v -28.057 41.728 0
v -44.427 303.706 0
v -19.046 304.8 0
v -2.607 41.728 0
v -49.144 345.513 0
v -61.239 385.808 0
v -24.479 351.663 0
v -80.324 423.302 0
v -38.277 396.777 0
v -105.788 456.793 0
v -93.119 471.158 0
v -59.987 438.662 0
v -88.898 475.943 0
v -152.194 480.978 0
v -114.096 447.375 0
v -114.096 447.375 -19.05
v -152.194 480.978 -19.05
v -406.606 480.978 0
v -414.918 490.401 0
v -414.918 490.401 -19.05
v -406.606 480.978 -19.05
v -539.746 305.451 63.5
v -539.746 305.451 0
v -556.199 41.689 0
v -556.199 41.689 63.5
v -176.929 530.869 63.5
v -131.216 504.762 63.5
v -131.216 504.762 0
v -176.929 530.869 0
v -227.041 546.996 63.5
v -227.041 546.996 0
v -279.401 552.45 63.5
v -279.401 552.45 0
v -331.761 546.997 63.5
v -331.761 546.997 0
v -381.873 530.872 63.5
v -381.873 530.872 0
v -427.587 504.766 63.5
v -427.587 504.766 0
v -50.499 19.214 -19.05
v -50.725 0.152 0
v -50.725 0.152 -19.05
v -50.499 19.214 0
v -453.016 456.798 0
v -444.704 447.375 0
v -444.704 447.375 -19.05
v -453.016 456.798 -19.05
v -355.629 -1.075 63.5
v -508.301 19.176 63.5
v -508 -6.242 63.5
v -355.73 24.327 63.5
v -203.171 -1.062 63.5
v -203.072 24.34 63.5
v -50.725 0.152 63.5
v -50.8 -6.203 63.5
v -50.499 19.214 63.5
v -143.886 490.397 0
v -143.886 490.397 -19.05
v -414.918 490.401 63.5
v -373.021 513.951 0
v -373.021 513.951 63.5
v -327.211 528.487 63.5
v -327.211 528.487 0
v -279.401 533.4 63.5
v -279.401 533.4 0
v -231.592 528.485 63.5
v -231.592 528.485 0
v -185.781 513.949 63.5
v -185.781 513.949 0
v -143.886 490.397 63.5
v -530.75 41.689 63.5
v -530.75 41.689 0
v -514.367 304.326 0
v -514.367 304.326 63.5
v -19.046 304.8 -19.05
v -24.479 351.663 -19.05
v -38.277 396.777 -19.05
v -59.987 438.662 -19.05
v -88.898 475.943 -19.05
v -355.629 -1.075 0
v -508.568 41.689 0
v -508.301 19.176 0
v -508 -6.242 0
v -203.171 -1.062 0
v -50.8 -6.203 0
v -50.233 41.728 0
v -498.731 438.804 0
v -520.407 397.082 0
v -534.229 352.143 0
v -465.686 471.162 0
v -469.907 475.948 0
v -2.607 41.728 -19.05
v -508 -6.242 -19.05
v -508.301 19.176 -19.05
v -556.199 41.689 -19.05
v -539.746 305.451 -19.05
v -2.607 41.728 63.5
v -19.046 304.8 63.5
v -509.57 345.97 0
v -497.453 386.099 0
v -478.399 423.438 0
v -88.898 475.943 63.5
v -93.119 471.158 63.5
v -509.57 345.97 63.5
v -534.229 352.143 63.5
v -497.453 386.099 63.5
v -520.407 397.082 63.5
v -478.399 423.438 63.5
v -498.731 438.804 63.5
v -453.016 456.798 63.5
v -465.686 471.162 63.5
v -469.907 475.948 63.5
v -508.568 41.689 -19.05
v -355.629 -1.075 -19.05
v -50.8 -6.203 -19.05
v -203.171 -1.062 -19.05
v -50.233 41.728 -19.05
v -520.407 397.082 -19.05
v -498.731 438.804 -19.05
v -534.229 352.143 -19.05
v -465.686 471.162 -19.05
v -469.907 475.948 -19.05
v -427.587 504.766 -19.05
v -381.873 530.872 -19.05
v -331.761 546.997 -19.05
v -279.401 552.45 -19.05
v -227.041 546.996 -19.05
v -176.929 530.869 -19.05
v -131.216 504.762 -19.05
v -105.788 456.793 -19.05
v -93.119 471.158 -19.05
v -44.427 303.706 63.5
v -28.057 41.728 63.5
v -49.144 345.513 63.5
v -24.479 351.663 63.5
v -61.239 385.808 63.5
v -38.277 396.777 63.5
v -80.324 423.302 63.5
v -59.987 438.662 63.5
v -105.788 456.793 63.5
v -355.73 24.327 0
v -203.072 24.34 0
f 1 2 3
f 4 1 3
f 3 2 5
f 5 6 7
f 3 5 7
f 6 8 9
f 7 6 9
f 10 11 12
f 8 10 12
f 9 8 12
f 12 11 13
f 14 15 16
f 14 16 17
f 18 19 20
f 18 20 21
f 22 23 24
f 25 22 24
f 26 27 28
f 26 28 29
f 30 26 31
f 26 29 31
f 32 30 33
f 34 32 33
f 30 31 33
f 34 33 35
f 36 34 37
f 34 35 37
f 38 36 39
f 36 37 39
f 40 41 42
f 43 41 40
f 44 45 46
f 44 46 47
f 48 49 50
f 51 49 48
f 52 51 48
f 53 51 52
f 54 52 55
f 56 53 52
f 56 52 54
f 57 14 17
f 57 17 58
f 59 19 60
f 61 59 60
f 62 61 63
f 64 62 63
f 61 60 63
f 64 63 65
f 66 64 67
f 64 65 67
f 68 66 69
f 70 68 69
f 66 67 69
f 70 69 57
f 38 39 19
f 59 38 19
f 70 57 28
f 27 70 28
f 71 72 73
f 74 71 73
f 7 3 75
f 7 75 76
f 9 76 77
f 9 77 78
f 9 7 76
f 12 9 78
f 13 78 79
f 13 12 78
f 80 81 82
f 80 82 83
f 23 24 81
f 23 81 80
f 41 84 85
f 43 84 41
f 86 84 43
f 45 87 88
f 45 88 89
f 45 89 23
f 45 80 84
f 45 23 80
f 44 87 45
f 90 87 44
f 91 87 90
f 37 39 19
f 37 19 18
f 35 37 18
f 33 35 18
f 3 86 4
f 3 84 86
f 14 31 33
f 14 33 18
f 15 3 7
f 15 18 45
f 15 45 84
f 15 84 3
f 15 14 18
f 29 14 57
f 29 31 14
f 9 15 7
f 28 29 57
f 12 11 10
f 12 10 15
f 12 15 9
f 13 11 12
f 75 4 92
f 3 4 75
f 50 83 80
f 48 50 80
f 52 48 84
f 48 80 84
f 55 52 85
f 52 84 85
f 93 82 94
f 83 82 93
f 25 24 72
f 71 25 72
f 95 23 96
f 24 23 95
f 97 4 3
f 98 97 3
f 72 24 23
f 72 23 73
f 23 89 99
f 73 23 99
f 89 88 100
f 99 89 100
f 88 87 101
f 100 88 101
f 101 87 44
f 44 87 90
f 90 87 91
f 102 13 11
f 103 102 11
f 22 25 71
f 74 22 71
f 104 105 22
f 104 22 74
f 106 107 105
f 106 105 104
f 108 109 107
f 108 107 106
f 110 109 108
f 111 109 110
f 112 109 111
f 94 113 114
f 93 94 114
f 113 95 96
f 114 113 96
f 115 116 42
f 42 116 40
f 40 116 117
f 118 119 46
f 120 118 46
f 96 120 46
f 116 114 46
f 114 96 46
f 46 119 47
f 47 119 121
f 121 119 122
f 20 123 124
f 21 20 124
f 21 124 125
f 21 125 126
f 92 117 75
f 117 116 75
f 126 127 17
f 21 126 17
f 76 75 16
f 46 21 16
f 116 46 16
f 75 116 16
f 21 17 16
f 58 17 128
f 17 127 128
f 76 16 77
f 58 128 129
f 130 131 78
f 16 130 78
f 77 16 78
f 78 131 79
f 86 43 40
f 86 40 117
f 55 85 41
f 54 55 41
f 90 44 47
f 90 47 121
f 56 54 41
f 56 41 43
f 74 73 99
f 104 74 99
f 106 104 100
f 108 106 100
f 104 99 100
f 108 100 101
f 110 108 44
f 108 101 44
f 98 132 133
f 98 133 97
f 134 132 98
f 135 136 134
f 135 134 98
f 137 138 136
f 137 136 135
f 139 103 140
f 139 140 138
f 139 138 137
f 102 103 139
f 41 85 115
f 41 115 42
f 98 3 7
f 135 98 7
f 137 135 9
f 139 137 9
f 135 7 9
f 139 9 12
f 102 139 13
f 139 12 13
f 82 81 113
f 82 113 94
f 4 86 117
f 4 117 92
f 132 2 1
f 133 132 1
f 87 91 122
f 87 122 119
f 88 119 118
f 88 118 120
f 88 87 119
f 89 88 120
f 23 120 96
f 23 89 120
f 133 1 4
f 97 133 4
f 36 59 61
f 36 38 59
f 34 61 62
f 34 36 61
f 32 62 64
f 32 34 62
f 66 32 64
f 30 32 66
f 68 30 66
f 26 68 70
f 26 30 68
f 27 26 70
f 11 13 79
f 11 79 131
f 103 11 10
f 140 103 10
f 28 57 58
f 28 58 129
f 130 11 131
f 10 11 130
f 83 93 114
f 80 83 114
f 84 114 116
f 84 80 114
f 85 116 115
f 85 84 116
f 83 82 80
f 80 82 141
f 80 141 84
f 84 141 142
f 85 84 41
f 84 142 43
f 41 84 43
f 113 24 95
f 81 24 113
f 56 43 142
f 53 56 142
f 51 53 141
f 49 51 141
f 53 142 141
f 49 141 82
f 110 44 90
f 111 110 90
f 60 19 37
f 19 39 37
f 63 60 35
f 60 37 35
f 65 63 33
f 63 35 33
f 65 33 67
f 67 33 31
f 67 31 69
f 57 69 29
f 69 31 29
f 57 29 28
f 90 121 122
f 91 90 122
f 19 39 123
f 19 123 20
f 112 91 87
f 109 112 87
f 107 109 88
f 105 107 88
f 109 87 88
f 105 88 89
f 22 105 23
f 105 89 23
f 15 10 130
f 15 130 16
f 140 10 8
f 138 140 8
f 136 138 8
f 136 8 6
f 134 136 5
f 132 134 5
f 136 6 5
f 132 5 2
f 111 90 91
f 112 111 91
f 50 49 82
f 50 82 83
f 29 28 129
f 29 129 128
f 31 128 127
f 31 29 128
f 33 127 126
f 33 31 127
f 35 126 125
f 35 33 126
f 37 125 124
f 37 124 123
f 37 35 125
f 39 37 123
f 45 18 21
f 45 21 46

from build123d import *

# Parameters (mm, degrees)
F1_DEPTH = 63.5
F2_DEPTH = 19.05


with BuildPart() as f1:
    # F0 (on Top) → F1 (new body)
    with BuildSketch(Plane.XY):
        with BuildLine():
            Line((-50.724847, 0.151526), (-50.499388, 19.214443))
            ThreePointArc((-50.499388, 19.214443), (-279.400876, 24.975758), (-508.301389, 19.175796))
            Line((-508.301389, 19.175796), (-508, -6.241581))
            ThreePointArc((-508, -6.241581), (-279.400492, -0.424242), (-50.8, -6.202807))
            Line((-50.8, -6.202807), (-50.724847, 0.151526))
        make_face()
        with BuildLine():
            Line((-2.607415, 41.7279), (-19.045769, 304.8))
            ThreePointArc((-19.045769, 304.8), (-38.276954, 396.777465), (-88.897541, 475.943421))
            Line((-88.897541, 475.943421), (-93.118576, 471.157759))
            Line((-93.118576, 471.157759), (-105.788427, 456.793126))
            ThreePointArc((-105.788427, 456.793126), (-61.239146, 385.808392), (-44.426941, 303.70589))
            Line((-44.426941, 303.70589), (-28.056954, 41.7279))
            Line((-28.056954, 41.7279), (-2.607415, 41.7279))
        make_face()
        with BuildLine():
            ThreePointArc((-414.91762, 490.401024), (-279.401039, 533.4), (-143.885626, 490.397344))
            Line((-143.885626, 490.397344), (-131.215844, 504.761899))
            ThreePointArc((-131.215844, 504.761899), (-279.401042, 552.45), (-427.587437, 504.765619))
            Line((-427.587437, 504.765619), (-414.91762, 490.401024))
        make_face()
        with BuildLine():
            Line((-556.19941, 41.689109), (-530.750038, 41.689109))
            Line((-530.750038, 41.689109), (-514.366597, 304.326076))
            ThreePointArc((-514.366597, 304.326076), (-497.452531, 386.099192), (-453.015732, 456.797841))
            Line((-453.015732, 456.797841), (-465.685548, 471.162435))
            Line((-465.685548, 471.162435), (-469.906573, 475.948085))
            ThreePointArc((-469.906573, 475.948085), (-520.406988, 397.082001), (-539.745769, 305.451424))
            Line((-539.745769, 305.451424), (-556.19941, 41.689109))
        make_face()
    extrude(amount=F1_DEPTH)


with BuildPart() as f2:
    # F0 (on Top) → F2 (new body)
    with BuildSketch(Plane.XY):
        with BuildLine():
            Line((-2.607415, 41.7279), (-19.045769, 304.8))
            ThreePointArc((-19.045769, 304.8), (-38.276954, 396.777465), (-88.897541, 475.943421))
            Line((-88.897541, 475.943421), (-93.118576, 471.157759))
            Line((-93.118576, 471.157759), (-105.788427, 456.793126))
            ThreePointArc((-105.788427, 456.793126), (-61.239146, 385.808392), (-44.426941, 303.70589))
            Line((-44.426941, 303.70589), (-28.056954, 41.7279))
            Line((-28.056954, 41.7279), (-2.607415, 41.7279))
        make_face()
        with BuildLine():
            Line((-50.23312, 41.7279), (-28.056954, 41.7279))
            Line((-28.056954, 41.7279), (-44.426941, 303.70589))
            ThreePointArc((-44.426941, 303.70589), (-61.239146, 385.808392), (-105.788427, 456.793126))
            Line((-105.788427, 456.793126), (-114.095815, 447.374502))
            Line((-114.095815, 447.374502), (-152.193926, 480.977685))
            Line((-152.193926, 480.977685), (-143.885626, 490.397344))
            ThreePointArc((-143.885626, 490.397344), (-279.401039, 533.4), (-414.91762, 490.401024))
            Line((-414.91762, 490.401024), (-406.606074, 480.977685))
            Line((-406.606074, 480.977685), (-444.704185, 447.374502))
            Line((-444.704185, 447.374502), (-453.015732, 456.797841))
            ThreePointArc((-453.015732, 456.797841), (-497.452531, 386.099192), (-514.366597, 304.326076))
            Line((-514.366597, 304.326076), (-530.750038, 41.689109))
            Line((-530.750038, 41.689109), (-508.568342, 41.689109))
            Line((-508.568342, 41.689109), (-508.301389, 19.175796))
            ThreePointArc((-508.301389, 19.175796), (-279.400876, 24.975758), (-50.499388, 19.214443))
            Line((-50.499388, 19.214443), (-50.23312, 41.7279))
        make_face()
        with BuildLine():
            Line((-50.724847, 0.151526), (-50.499388, 19.214443))
            ThreePointArc((-50.499388, 19.214443), (-279.400876, 24.975758), (-508.301389, 19.175796))
            Line((-508.301389, 19.175796), (-508, -6.241581))
            ThreePointArc((-508, -6.241581), (-279.400492, -0.424242), (-50.8, -6.202807))
            Line((-50.8, -6.202807), (-50.724847, 0.151526))
        make_face()
        with BuildLine():
            ThreePointArc((-414.91762, 490.401024), (-279.401039, 533.4), (-143.885626, 490.397344))
            Line((-143.885626, 490.397344), (-131.215844, 504.761899))
            ThreePointArc((-131.215844, 504.761899), (-279.401042, 552.45), (-427.587437, 504.765619))
            Line((-427.587437, 504.765619), (-414.91762, 490.401024))
        make_face()
        with BuildLine():
            Line((-556.19941, 41.689109), (-530.750038, 41.689109))
            Line((-530.750038, 41.689109), (-514.366597, 304.326076))
            ThreePointArc((-514.366597, 304.326076), (-497.452531, 386.099192), (-453.015732, 456.797841))
            Line((-453.015732, 456.797841), (-465.685548, 471.162435))
            Line((-465.685548, 471.162435), (-469.906573, 475.948085))
            ThreePointArc((-469.906573, 475.948085), (-520.406988, 397.082001), (-539.745769, 305.451424))
            Line((-539.745769, 305.451424), (-556.19941, 41.689109))
        make_face()
    extrude(amount=-F2_DEPTH)


solid = Compound([f1.part, f2.part])
